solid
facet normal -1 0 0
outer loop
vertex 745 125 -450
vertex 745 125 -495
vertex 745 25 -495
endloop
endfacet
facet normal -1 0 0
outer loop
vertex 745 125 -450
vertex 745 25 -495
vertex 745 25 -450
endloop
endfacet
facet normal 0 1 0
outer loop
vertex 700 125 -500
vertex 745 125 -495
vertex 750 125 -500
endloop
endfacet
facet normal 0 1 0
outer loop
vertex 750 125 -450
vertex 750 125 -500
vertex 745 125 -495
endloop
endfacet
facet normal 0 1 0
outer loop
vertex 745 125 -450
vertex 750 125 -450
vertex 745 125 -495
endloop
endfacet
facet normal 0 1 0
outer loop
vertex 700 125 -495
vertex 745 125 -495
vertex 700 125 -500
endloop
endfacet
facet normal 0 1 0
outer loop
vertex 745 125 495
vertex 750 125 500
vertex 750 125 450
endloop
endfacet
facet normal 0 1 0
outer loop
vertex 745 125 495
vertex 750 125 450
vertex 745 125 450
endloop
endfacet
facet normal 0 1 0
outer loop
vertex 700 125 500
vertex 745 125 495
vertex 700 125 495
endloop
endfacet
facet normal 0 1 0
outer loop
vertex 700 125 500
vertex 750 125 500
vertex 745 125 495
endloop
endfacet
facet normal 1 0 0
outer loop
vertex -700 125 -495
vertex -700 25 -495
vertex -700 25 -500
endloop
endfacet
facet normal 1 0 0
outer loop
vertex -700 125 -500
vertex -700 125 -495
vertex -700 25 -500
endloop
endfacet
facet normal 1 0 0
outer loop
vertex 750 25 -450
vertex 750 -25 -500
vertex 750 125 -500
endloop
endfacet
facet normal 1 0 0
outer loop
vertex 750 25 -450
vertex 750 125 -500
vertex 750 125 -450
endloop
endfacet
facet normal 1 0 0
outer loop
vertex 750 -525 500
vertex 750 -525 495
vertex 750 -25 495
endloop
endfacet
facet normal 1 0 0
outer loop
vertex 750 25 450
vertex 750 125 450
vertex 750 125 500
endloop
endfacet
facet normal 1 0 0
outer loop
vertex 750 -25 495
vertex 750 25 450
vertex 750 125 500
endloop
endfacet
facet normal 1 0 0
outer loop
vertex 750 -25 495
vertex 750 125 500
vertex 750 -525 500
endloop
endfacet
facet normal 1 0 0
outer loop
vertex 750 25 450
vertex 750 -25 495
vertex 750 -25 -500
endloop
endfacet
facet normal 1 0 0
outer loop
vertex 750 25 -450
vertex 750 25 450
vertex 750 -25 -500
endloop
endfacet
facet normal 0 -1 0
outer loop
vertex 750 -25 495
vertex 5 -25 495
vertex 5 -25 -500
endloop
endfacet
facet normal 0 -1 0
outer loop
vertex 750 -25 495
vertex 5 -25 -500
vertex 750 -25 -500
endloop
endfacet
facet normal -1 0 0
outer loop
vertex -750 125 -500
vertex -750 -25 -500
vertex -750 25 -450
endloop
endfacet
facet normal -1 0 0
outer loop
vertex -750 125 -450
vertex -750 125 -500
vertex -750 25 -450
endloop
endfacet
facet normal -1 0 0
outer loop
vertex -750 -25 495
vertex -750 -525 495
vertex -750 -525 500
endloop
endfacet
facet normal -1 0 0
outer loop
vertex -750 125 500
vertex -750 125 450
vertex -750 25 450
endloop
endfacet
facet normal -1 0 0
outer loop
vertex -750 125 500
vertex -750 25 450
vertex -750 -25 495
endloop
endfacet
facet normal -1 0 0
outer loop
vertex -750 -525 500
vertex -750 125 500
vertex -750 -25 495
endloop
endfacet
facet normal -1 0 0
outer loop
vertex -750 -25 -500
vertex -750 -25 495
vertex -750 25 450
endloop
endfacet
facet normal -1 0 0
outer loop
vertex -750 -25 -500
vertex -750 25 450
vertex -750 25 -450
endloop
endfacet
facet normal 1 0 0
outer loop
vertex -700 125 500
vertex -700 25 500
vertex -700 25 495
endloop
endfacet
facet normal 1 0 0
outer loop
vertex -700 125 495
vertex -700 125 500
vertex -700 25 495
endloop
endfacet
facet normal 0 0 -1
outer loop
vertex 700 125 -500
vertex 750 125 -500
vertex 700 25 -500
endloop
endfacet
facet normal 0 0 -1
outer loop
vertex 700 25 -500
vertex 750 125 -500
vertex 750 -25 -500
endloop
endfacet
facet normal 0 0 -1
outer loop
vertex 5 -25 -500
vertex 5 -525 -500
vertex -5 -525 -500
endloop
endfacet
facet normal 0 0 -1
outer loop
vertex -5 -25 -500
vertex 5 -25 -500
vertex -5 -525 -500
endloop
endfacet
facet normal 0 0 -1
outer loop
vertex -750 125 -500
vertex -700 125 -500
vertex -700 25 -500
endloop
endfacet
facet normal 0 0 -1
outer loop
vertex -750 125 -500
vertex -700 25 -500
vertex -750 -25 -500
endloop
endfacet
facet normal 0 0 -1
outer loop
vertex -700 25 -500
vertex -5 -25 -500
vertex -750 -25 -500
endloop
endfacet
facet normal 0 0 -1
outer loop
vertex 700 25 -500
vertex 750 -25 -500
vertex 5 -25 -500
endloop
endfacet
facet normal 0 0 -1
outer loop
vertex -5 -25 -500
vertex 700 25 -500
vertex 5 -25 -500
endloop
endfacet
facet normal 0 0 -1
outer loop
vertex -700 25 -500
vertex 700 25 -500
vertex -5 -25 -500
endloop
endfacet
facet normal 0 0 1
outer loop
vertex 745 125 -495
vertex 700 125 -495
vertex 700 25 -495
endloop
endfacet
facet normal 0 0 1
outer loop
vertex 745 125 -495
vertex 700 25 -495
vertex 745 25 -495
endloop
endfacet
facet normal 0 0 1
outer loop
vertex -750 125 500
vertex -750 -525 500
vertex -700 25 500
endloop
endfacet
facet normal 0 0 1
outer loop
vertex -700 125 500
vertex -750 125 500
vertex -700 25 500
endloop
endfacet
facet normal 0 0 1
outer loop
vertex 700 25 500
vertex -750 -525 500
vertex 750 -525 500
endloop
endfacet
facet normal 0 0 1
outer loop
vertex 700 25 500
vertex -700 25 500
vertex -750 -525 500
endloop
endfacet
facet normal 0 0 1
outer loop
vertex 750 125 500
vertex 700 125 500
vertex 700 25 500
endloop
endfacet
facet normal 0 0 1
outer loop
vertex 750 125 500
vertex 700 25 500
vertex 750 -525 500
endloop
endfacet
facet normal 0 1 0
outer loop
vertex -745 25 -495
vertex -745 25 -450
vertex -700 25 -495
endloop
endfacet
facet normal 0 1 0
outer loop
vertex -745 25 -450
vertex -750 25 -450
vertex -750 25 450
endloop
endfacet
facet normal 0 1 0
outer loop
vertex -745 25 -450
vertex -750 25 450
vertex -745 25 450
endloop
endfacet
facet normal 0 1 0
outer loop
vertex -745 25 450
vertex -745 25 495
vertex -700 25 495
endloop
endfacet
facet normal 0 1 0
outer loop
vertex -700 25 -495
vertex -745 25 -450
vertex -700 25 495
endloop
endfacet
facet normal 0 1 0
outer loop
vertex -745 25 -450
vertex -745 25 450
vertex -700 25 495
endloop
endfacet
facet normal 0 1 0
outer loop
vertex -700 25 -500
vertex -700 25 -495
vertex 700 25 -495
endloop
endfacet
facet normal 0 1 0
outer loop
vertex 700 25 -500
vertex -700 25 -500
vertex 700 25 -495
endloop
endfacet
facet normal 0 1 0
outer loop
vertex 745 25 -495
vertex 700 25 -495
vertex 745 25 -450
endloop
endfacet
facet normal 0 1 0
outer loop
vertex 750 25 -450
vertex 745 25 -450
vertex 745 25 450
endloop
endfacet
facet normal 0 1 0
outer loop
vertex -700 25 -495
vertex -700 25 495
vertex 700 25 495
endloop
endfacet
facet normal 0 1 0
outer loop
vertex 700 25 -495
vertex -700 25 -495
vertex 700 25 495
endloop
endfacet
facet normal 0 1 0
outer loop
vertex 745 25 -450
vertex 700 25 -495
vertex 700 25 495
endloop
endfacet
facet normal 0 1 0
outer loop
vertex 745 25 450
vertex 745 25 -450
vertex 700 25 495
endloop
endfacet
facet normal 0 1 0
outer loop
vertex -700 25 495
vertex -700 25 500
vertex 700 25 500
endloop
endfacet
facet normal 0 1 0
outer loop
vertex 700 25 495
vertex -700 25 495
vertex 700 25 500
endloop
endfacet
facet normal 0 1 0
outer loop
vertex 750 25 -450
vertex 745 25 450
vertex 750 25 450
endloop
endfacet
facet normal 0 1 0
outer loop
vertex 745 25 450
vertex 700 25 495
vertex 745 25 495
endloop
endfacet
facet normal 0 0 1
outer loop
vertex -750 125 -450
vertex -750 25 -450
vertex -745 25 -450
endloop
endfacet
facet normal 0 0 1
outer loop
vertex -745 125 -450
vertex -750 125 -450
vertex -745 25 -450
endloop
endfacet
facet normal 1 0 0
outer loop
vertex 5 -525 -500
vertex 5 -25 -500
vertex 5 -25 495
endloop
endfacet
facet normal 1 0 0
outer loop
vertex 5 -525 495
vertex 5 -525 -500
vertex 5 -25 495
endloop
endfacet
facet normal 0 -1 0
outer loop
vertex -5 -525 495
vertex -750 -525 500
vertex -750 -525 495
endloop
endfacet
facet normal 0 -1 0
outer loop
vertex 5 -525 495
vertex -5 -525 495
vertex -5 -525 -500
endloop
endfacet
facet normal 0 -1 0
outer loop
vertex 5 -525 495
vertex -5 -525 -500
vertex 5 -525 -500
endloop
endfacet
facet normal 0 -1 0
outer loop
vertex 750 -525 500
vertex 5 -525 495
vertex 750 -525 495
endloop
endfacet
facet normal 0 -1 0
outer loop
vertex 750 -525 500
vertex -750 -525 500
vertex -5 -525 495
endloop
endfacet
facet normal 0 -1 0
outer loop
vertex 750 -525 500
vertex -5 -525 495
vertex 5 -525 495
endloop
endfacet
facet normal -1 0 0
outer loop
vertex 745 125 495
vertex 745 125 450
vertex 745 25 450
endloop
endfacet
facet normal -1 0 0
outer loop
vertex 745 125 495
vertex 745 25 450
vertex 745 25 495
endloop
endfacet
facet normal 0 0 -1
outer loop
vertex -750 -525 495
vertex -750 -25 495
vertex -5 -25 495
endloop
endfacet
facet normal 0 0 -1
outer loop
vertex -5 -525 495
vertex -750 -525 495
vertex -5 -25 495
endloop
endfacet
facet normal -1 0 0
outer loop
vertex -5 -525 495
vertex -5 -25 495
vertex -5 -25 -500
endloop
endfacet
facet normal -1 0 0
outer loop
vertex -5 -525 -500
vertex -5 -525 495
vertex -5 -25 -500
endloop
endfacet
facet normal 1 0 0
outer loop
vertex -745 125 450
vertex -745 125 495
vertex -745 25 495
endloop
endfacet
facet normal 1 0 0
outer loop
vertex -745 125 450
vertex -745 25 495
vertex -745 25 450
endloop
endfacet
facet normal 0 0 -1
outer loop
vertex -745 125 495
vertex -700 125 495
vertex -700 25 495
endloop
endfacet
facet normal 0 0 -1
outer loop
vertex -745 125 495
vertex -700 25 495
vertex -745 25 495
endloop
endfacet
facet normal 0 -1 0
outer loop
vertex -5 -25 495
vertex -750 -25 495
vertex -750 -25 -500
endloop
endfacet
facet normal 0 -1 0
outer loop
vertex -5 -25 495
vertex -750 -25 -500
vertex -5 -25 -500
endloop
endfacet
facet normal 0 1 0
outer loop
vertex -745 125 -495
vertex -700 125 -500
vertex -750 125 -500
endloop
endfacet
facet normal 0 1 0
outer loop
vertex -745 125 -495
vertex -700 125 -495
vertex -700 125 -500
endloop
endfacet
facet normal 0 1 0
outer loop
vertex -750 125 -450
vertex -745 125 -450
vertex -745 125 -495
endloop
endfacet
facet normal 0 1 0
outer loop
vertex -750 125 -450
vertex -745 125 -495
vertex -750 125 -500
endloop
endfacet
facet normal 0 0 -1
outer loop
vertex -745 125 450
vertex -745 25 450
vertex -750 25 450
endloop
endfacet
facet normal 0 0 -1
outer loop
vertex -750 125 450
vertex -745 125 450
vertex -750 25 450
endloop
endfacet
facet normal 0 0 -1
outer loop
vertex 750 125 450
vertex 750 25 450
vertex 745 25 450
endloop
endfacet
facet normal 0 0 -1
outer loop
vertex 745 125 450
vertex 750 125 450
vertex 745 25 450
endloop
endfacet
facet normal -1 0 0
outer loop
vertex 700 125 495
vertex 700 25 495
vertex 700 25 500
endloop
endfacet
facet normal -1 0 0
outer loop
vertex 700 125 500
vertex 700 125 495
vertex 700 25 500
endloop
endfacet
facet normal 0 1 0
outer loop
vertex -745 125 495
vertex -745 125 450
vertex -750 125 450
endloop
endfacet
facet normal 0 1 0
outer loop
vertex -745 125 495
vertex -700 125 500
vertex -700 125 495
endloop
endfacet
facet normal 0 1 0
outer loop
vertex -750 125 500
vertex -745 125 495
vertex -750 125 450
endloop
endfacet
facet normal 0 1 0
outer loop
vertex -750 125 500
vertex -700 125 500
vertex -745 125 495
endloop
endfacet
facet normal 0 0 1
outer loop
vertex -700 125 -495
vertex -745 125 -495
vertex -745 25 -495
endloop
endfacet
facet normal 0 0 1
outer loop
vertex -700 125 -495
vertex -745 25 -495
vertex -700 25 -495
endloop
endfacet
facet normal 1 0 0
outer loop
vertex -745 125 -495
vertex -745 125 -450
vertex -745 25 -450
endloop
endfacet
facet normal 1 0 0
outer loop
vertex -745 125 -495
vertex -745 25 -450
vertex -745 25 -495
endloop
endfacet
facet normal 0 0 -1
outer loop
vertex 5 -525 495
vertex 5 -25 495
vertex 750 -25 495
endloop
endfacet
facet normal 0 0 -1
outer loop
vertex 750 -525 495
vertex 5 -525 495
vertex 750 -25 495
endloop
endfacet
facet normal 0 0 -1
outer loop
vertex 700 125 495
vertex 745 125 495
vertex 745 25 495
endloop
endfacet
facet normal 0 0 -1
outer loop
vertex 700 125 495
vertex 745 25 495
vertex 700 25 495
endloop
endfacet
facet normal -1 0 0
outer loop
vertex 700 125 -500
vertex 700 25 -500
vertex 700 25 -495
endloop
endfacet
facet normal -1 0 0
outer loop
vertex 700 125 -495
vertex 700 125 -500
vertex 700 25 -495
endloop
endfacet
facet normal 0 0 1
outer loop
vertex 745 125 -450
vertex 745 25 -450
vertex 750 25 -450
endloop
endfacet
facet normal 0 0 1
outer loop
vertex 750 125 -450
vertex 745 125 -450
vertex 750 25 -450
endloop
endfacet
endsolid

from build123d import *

# Parameters (mm, degrees)
F0_W     = 1500
F0_H     = 1000
F1_DEPTH = 25
F3_DEPTH = 100
F4_W     = 1500
F4_H     = 5
F5_DEPTH = 500
F7_DEPTH = 500


with BuildPart() as f1:
    # F0 (on Front) → F1 (new body, symmetric)
    with BuildSketch(Plane.XZ):
        Rectangle(F0_W, F0_H)
    extrude(amount=F1_DEPTH, both=True)

    # F2 (on face) → F3 (join)
    with BuildSketch(Plane(origin=(0, 25, 0), x_dir=(-1, 0, 0), z_dir=(0, 1, 0))):
        Polygon((700, -500), (750, -500), (750, -450), (745, -450), (745, -495), (700, -495), align=None)
        Polygon((-750, -500), (-700, -500), (-700, -495), (-745, -495), (-745, -450), (-750, -450), align=None)
        Polygon((-700, 495), (-700, 500), (-750, 500), (-750, 450), (-745, 450), (-745, 495), align=None)
        Polygon((745, 450), (750, 450), (750, 500), (700, 500), (700, 495), (745, 495), align=None)
    extrude(amount=F3_DEPTH)

    # F4 (on face) → F5 (join)
    with BuildSketch(Plane.XZ.offset(25)):
        with Locations((0, 497.5)):
            Rectangle(F4_W, F4_H)
    extrude(amount=F5_DEPTH)

    # F6 (on face) → F7 (join)
    with BuildSketch(Plane.XZ.offset(25)):
        Polygon((-5, -500), (0, -500), (5, -500), (5, 495), (0, 495), (-5, 495), align=None)
    extrude(amount=F7_DEPTH)


solid = f1.part
